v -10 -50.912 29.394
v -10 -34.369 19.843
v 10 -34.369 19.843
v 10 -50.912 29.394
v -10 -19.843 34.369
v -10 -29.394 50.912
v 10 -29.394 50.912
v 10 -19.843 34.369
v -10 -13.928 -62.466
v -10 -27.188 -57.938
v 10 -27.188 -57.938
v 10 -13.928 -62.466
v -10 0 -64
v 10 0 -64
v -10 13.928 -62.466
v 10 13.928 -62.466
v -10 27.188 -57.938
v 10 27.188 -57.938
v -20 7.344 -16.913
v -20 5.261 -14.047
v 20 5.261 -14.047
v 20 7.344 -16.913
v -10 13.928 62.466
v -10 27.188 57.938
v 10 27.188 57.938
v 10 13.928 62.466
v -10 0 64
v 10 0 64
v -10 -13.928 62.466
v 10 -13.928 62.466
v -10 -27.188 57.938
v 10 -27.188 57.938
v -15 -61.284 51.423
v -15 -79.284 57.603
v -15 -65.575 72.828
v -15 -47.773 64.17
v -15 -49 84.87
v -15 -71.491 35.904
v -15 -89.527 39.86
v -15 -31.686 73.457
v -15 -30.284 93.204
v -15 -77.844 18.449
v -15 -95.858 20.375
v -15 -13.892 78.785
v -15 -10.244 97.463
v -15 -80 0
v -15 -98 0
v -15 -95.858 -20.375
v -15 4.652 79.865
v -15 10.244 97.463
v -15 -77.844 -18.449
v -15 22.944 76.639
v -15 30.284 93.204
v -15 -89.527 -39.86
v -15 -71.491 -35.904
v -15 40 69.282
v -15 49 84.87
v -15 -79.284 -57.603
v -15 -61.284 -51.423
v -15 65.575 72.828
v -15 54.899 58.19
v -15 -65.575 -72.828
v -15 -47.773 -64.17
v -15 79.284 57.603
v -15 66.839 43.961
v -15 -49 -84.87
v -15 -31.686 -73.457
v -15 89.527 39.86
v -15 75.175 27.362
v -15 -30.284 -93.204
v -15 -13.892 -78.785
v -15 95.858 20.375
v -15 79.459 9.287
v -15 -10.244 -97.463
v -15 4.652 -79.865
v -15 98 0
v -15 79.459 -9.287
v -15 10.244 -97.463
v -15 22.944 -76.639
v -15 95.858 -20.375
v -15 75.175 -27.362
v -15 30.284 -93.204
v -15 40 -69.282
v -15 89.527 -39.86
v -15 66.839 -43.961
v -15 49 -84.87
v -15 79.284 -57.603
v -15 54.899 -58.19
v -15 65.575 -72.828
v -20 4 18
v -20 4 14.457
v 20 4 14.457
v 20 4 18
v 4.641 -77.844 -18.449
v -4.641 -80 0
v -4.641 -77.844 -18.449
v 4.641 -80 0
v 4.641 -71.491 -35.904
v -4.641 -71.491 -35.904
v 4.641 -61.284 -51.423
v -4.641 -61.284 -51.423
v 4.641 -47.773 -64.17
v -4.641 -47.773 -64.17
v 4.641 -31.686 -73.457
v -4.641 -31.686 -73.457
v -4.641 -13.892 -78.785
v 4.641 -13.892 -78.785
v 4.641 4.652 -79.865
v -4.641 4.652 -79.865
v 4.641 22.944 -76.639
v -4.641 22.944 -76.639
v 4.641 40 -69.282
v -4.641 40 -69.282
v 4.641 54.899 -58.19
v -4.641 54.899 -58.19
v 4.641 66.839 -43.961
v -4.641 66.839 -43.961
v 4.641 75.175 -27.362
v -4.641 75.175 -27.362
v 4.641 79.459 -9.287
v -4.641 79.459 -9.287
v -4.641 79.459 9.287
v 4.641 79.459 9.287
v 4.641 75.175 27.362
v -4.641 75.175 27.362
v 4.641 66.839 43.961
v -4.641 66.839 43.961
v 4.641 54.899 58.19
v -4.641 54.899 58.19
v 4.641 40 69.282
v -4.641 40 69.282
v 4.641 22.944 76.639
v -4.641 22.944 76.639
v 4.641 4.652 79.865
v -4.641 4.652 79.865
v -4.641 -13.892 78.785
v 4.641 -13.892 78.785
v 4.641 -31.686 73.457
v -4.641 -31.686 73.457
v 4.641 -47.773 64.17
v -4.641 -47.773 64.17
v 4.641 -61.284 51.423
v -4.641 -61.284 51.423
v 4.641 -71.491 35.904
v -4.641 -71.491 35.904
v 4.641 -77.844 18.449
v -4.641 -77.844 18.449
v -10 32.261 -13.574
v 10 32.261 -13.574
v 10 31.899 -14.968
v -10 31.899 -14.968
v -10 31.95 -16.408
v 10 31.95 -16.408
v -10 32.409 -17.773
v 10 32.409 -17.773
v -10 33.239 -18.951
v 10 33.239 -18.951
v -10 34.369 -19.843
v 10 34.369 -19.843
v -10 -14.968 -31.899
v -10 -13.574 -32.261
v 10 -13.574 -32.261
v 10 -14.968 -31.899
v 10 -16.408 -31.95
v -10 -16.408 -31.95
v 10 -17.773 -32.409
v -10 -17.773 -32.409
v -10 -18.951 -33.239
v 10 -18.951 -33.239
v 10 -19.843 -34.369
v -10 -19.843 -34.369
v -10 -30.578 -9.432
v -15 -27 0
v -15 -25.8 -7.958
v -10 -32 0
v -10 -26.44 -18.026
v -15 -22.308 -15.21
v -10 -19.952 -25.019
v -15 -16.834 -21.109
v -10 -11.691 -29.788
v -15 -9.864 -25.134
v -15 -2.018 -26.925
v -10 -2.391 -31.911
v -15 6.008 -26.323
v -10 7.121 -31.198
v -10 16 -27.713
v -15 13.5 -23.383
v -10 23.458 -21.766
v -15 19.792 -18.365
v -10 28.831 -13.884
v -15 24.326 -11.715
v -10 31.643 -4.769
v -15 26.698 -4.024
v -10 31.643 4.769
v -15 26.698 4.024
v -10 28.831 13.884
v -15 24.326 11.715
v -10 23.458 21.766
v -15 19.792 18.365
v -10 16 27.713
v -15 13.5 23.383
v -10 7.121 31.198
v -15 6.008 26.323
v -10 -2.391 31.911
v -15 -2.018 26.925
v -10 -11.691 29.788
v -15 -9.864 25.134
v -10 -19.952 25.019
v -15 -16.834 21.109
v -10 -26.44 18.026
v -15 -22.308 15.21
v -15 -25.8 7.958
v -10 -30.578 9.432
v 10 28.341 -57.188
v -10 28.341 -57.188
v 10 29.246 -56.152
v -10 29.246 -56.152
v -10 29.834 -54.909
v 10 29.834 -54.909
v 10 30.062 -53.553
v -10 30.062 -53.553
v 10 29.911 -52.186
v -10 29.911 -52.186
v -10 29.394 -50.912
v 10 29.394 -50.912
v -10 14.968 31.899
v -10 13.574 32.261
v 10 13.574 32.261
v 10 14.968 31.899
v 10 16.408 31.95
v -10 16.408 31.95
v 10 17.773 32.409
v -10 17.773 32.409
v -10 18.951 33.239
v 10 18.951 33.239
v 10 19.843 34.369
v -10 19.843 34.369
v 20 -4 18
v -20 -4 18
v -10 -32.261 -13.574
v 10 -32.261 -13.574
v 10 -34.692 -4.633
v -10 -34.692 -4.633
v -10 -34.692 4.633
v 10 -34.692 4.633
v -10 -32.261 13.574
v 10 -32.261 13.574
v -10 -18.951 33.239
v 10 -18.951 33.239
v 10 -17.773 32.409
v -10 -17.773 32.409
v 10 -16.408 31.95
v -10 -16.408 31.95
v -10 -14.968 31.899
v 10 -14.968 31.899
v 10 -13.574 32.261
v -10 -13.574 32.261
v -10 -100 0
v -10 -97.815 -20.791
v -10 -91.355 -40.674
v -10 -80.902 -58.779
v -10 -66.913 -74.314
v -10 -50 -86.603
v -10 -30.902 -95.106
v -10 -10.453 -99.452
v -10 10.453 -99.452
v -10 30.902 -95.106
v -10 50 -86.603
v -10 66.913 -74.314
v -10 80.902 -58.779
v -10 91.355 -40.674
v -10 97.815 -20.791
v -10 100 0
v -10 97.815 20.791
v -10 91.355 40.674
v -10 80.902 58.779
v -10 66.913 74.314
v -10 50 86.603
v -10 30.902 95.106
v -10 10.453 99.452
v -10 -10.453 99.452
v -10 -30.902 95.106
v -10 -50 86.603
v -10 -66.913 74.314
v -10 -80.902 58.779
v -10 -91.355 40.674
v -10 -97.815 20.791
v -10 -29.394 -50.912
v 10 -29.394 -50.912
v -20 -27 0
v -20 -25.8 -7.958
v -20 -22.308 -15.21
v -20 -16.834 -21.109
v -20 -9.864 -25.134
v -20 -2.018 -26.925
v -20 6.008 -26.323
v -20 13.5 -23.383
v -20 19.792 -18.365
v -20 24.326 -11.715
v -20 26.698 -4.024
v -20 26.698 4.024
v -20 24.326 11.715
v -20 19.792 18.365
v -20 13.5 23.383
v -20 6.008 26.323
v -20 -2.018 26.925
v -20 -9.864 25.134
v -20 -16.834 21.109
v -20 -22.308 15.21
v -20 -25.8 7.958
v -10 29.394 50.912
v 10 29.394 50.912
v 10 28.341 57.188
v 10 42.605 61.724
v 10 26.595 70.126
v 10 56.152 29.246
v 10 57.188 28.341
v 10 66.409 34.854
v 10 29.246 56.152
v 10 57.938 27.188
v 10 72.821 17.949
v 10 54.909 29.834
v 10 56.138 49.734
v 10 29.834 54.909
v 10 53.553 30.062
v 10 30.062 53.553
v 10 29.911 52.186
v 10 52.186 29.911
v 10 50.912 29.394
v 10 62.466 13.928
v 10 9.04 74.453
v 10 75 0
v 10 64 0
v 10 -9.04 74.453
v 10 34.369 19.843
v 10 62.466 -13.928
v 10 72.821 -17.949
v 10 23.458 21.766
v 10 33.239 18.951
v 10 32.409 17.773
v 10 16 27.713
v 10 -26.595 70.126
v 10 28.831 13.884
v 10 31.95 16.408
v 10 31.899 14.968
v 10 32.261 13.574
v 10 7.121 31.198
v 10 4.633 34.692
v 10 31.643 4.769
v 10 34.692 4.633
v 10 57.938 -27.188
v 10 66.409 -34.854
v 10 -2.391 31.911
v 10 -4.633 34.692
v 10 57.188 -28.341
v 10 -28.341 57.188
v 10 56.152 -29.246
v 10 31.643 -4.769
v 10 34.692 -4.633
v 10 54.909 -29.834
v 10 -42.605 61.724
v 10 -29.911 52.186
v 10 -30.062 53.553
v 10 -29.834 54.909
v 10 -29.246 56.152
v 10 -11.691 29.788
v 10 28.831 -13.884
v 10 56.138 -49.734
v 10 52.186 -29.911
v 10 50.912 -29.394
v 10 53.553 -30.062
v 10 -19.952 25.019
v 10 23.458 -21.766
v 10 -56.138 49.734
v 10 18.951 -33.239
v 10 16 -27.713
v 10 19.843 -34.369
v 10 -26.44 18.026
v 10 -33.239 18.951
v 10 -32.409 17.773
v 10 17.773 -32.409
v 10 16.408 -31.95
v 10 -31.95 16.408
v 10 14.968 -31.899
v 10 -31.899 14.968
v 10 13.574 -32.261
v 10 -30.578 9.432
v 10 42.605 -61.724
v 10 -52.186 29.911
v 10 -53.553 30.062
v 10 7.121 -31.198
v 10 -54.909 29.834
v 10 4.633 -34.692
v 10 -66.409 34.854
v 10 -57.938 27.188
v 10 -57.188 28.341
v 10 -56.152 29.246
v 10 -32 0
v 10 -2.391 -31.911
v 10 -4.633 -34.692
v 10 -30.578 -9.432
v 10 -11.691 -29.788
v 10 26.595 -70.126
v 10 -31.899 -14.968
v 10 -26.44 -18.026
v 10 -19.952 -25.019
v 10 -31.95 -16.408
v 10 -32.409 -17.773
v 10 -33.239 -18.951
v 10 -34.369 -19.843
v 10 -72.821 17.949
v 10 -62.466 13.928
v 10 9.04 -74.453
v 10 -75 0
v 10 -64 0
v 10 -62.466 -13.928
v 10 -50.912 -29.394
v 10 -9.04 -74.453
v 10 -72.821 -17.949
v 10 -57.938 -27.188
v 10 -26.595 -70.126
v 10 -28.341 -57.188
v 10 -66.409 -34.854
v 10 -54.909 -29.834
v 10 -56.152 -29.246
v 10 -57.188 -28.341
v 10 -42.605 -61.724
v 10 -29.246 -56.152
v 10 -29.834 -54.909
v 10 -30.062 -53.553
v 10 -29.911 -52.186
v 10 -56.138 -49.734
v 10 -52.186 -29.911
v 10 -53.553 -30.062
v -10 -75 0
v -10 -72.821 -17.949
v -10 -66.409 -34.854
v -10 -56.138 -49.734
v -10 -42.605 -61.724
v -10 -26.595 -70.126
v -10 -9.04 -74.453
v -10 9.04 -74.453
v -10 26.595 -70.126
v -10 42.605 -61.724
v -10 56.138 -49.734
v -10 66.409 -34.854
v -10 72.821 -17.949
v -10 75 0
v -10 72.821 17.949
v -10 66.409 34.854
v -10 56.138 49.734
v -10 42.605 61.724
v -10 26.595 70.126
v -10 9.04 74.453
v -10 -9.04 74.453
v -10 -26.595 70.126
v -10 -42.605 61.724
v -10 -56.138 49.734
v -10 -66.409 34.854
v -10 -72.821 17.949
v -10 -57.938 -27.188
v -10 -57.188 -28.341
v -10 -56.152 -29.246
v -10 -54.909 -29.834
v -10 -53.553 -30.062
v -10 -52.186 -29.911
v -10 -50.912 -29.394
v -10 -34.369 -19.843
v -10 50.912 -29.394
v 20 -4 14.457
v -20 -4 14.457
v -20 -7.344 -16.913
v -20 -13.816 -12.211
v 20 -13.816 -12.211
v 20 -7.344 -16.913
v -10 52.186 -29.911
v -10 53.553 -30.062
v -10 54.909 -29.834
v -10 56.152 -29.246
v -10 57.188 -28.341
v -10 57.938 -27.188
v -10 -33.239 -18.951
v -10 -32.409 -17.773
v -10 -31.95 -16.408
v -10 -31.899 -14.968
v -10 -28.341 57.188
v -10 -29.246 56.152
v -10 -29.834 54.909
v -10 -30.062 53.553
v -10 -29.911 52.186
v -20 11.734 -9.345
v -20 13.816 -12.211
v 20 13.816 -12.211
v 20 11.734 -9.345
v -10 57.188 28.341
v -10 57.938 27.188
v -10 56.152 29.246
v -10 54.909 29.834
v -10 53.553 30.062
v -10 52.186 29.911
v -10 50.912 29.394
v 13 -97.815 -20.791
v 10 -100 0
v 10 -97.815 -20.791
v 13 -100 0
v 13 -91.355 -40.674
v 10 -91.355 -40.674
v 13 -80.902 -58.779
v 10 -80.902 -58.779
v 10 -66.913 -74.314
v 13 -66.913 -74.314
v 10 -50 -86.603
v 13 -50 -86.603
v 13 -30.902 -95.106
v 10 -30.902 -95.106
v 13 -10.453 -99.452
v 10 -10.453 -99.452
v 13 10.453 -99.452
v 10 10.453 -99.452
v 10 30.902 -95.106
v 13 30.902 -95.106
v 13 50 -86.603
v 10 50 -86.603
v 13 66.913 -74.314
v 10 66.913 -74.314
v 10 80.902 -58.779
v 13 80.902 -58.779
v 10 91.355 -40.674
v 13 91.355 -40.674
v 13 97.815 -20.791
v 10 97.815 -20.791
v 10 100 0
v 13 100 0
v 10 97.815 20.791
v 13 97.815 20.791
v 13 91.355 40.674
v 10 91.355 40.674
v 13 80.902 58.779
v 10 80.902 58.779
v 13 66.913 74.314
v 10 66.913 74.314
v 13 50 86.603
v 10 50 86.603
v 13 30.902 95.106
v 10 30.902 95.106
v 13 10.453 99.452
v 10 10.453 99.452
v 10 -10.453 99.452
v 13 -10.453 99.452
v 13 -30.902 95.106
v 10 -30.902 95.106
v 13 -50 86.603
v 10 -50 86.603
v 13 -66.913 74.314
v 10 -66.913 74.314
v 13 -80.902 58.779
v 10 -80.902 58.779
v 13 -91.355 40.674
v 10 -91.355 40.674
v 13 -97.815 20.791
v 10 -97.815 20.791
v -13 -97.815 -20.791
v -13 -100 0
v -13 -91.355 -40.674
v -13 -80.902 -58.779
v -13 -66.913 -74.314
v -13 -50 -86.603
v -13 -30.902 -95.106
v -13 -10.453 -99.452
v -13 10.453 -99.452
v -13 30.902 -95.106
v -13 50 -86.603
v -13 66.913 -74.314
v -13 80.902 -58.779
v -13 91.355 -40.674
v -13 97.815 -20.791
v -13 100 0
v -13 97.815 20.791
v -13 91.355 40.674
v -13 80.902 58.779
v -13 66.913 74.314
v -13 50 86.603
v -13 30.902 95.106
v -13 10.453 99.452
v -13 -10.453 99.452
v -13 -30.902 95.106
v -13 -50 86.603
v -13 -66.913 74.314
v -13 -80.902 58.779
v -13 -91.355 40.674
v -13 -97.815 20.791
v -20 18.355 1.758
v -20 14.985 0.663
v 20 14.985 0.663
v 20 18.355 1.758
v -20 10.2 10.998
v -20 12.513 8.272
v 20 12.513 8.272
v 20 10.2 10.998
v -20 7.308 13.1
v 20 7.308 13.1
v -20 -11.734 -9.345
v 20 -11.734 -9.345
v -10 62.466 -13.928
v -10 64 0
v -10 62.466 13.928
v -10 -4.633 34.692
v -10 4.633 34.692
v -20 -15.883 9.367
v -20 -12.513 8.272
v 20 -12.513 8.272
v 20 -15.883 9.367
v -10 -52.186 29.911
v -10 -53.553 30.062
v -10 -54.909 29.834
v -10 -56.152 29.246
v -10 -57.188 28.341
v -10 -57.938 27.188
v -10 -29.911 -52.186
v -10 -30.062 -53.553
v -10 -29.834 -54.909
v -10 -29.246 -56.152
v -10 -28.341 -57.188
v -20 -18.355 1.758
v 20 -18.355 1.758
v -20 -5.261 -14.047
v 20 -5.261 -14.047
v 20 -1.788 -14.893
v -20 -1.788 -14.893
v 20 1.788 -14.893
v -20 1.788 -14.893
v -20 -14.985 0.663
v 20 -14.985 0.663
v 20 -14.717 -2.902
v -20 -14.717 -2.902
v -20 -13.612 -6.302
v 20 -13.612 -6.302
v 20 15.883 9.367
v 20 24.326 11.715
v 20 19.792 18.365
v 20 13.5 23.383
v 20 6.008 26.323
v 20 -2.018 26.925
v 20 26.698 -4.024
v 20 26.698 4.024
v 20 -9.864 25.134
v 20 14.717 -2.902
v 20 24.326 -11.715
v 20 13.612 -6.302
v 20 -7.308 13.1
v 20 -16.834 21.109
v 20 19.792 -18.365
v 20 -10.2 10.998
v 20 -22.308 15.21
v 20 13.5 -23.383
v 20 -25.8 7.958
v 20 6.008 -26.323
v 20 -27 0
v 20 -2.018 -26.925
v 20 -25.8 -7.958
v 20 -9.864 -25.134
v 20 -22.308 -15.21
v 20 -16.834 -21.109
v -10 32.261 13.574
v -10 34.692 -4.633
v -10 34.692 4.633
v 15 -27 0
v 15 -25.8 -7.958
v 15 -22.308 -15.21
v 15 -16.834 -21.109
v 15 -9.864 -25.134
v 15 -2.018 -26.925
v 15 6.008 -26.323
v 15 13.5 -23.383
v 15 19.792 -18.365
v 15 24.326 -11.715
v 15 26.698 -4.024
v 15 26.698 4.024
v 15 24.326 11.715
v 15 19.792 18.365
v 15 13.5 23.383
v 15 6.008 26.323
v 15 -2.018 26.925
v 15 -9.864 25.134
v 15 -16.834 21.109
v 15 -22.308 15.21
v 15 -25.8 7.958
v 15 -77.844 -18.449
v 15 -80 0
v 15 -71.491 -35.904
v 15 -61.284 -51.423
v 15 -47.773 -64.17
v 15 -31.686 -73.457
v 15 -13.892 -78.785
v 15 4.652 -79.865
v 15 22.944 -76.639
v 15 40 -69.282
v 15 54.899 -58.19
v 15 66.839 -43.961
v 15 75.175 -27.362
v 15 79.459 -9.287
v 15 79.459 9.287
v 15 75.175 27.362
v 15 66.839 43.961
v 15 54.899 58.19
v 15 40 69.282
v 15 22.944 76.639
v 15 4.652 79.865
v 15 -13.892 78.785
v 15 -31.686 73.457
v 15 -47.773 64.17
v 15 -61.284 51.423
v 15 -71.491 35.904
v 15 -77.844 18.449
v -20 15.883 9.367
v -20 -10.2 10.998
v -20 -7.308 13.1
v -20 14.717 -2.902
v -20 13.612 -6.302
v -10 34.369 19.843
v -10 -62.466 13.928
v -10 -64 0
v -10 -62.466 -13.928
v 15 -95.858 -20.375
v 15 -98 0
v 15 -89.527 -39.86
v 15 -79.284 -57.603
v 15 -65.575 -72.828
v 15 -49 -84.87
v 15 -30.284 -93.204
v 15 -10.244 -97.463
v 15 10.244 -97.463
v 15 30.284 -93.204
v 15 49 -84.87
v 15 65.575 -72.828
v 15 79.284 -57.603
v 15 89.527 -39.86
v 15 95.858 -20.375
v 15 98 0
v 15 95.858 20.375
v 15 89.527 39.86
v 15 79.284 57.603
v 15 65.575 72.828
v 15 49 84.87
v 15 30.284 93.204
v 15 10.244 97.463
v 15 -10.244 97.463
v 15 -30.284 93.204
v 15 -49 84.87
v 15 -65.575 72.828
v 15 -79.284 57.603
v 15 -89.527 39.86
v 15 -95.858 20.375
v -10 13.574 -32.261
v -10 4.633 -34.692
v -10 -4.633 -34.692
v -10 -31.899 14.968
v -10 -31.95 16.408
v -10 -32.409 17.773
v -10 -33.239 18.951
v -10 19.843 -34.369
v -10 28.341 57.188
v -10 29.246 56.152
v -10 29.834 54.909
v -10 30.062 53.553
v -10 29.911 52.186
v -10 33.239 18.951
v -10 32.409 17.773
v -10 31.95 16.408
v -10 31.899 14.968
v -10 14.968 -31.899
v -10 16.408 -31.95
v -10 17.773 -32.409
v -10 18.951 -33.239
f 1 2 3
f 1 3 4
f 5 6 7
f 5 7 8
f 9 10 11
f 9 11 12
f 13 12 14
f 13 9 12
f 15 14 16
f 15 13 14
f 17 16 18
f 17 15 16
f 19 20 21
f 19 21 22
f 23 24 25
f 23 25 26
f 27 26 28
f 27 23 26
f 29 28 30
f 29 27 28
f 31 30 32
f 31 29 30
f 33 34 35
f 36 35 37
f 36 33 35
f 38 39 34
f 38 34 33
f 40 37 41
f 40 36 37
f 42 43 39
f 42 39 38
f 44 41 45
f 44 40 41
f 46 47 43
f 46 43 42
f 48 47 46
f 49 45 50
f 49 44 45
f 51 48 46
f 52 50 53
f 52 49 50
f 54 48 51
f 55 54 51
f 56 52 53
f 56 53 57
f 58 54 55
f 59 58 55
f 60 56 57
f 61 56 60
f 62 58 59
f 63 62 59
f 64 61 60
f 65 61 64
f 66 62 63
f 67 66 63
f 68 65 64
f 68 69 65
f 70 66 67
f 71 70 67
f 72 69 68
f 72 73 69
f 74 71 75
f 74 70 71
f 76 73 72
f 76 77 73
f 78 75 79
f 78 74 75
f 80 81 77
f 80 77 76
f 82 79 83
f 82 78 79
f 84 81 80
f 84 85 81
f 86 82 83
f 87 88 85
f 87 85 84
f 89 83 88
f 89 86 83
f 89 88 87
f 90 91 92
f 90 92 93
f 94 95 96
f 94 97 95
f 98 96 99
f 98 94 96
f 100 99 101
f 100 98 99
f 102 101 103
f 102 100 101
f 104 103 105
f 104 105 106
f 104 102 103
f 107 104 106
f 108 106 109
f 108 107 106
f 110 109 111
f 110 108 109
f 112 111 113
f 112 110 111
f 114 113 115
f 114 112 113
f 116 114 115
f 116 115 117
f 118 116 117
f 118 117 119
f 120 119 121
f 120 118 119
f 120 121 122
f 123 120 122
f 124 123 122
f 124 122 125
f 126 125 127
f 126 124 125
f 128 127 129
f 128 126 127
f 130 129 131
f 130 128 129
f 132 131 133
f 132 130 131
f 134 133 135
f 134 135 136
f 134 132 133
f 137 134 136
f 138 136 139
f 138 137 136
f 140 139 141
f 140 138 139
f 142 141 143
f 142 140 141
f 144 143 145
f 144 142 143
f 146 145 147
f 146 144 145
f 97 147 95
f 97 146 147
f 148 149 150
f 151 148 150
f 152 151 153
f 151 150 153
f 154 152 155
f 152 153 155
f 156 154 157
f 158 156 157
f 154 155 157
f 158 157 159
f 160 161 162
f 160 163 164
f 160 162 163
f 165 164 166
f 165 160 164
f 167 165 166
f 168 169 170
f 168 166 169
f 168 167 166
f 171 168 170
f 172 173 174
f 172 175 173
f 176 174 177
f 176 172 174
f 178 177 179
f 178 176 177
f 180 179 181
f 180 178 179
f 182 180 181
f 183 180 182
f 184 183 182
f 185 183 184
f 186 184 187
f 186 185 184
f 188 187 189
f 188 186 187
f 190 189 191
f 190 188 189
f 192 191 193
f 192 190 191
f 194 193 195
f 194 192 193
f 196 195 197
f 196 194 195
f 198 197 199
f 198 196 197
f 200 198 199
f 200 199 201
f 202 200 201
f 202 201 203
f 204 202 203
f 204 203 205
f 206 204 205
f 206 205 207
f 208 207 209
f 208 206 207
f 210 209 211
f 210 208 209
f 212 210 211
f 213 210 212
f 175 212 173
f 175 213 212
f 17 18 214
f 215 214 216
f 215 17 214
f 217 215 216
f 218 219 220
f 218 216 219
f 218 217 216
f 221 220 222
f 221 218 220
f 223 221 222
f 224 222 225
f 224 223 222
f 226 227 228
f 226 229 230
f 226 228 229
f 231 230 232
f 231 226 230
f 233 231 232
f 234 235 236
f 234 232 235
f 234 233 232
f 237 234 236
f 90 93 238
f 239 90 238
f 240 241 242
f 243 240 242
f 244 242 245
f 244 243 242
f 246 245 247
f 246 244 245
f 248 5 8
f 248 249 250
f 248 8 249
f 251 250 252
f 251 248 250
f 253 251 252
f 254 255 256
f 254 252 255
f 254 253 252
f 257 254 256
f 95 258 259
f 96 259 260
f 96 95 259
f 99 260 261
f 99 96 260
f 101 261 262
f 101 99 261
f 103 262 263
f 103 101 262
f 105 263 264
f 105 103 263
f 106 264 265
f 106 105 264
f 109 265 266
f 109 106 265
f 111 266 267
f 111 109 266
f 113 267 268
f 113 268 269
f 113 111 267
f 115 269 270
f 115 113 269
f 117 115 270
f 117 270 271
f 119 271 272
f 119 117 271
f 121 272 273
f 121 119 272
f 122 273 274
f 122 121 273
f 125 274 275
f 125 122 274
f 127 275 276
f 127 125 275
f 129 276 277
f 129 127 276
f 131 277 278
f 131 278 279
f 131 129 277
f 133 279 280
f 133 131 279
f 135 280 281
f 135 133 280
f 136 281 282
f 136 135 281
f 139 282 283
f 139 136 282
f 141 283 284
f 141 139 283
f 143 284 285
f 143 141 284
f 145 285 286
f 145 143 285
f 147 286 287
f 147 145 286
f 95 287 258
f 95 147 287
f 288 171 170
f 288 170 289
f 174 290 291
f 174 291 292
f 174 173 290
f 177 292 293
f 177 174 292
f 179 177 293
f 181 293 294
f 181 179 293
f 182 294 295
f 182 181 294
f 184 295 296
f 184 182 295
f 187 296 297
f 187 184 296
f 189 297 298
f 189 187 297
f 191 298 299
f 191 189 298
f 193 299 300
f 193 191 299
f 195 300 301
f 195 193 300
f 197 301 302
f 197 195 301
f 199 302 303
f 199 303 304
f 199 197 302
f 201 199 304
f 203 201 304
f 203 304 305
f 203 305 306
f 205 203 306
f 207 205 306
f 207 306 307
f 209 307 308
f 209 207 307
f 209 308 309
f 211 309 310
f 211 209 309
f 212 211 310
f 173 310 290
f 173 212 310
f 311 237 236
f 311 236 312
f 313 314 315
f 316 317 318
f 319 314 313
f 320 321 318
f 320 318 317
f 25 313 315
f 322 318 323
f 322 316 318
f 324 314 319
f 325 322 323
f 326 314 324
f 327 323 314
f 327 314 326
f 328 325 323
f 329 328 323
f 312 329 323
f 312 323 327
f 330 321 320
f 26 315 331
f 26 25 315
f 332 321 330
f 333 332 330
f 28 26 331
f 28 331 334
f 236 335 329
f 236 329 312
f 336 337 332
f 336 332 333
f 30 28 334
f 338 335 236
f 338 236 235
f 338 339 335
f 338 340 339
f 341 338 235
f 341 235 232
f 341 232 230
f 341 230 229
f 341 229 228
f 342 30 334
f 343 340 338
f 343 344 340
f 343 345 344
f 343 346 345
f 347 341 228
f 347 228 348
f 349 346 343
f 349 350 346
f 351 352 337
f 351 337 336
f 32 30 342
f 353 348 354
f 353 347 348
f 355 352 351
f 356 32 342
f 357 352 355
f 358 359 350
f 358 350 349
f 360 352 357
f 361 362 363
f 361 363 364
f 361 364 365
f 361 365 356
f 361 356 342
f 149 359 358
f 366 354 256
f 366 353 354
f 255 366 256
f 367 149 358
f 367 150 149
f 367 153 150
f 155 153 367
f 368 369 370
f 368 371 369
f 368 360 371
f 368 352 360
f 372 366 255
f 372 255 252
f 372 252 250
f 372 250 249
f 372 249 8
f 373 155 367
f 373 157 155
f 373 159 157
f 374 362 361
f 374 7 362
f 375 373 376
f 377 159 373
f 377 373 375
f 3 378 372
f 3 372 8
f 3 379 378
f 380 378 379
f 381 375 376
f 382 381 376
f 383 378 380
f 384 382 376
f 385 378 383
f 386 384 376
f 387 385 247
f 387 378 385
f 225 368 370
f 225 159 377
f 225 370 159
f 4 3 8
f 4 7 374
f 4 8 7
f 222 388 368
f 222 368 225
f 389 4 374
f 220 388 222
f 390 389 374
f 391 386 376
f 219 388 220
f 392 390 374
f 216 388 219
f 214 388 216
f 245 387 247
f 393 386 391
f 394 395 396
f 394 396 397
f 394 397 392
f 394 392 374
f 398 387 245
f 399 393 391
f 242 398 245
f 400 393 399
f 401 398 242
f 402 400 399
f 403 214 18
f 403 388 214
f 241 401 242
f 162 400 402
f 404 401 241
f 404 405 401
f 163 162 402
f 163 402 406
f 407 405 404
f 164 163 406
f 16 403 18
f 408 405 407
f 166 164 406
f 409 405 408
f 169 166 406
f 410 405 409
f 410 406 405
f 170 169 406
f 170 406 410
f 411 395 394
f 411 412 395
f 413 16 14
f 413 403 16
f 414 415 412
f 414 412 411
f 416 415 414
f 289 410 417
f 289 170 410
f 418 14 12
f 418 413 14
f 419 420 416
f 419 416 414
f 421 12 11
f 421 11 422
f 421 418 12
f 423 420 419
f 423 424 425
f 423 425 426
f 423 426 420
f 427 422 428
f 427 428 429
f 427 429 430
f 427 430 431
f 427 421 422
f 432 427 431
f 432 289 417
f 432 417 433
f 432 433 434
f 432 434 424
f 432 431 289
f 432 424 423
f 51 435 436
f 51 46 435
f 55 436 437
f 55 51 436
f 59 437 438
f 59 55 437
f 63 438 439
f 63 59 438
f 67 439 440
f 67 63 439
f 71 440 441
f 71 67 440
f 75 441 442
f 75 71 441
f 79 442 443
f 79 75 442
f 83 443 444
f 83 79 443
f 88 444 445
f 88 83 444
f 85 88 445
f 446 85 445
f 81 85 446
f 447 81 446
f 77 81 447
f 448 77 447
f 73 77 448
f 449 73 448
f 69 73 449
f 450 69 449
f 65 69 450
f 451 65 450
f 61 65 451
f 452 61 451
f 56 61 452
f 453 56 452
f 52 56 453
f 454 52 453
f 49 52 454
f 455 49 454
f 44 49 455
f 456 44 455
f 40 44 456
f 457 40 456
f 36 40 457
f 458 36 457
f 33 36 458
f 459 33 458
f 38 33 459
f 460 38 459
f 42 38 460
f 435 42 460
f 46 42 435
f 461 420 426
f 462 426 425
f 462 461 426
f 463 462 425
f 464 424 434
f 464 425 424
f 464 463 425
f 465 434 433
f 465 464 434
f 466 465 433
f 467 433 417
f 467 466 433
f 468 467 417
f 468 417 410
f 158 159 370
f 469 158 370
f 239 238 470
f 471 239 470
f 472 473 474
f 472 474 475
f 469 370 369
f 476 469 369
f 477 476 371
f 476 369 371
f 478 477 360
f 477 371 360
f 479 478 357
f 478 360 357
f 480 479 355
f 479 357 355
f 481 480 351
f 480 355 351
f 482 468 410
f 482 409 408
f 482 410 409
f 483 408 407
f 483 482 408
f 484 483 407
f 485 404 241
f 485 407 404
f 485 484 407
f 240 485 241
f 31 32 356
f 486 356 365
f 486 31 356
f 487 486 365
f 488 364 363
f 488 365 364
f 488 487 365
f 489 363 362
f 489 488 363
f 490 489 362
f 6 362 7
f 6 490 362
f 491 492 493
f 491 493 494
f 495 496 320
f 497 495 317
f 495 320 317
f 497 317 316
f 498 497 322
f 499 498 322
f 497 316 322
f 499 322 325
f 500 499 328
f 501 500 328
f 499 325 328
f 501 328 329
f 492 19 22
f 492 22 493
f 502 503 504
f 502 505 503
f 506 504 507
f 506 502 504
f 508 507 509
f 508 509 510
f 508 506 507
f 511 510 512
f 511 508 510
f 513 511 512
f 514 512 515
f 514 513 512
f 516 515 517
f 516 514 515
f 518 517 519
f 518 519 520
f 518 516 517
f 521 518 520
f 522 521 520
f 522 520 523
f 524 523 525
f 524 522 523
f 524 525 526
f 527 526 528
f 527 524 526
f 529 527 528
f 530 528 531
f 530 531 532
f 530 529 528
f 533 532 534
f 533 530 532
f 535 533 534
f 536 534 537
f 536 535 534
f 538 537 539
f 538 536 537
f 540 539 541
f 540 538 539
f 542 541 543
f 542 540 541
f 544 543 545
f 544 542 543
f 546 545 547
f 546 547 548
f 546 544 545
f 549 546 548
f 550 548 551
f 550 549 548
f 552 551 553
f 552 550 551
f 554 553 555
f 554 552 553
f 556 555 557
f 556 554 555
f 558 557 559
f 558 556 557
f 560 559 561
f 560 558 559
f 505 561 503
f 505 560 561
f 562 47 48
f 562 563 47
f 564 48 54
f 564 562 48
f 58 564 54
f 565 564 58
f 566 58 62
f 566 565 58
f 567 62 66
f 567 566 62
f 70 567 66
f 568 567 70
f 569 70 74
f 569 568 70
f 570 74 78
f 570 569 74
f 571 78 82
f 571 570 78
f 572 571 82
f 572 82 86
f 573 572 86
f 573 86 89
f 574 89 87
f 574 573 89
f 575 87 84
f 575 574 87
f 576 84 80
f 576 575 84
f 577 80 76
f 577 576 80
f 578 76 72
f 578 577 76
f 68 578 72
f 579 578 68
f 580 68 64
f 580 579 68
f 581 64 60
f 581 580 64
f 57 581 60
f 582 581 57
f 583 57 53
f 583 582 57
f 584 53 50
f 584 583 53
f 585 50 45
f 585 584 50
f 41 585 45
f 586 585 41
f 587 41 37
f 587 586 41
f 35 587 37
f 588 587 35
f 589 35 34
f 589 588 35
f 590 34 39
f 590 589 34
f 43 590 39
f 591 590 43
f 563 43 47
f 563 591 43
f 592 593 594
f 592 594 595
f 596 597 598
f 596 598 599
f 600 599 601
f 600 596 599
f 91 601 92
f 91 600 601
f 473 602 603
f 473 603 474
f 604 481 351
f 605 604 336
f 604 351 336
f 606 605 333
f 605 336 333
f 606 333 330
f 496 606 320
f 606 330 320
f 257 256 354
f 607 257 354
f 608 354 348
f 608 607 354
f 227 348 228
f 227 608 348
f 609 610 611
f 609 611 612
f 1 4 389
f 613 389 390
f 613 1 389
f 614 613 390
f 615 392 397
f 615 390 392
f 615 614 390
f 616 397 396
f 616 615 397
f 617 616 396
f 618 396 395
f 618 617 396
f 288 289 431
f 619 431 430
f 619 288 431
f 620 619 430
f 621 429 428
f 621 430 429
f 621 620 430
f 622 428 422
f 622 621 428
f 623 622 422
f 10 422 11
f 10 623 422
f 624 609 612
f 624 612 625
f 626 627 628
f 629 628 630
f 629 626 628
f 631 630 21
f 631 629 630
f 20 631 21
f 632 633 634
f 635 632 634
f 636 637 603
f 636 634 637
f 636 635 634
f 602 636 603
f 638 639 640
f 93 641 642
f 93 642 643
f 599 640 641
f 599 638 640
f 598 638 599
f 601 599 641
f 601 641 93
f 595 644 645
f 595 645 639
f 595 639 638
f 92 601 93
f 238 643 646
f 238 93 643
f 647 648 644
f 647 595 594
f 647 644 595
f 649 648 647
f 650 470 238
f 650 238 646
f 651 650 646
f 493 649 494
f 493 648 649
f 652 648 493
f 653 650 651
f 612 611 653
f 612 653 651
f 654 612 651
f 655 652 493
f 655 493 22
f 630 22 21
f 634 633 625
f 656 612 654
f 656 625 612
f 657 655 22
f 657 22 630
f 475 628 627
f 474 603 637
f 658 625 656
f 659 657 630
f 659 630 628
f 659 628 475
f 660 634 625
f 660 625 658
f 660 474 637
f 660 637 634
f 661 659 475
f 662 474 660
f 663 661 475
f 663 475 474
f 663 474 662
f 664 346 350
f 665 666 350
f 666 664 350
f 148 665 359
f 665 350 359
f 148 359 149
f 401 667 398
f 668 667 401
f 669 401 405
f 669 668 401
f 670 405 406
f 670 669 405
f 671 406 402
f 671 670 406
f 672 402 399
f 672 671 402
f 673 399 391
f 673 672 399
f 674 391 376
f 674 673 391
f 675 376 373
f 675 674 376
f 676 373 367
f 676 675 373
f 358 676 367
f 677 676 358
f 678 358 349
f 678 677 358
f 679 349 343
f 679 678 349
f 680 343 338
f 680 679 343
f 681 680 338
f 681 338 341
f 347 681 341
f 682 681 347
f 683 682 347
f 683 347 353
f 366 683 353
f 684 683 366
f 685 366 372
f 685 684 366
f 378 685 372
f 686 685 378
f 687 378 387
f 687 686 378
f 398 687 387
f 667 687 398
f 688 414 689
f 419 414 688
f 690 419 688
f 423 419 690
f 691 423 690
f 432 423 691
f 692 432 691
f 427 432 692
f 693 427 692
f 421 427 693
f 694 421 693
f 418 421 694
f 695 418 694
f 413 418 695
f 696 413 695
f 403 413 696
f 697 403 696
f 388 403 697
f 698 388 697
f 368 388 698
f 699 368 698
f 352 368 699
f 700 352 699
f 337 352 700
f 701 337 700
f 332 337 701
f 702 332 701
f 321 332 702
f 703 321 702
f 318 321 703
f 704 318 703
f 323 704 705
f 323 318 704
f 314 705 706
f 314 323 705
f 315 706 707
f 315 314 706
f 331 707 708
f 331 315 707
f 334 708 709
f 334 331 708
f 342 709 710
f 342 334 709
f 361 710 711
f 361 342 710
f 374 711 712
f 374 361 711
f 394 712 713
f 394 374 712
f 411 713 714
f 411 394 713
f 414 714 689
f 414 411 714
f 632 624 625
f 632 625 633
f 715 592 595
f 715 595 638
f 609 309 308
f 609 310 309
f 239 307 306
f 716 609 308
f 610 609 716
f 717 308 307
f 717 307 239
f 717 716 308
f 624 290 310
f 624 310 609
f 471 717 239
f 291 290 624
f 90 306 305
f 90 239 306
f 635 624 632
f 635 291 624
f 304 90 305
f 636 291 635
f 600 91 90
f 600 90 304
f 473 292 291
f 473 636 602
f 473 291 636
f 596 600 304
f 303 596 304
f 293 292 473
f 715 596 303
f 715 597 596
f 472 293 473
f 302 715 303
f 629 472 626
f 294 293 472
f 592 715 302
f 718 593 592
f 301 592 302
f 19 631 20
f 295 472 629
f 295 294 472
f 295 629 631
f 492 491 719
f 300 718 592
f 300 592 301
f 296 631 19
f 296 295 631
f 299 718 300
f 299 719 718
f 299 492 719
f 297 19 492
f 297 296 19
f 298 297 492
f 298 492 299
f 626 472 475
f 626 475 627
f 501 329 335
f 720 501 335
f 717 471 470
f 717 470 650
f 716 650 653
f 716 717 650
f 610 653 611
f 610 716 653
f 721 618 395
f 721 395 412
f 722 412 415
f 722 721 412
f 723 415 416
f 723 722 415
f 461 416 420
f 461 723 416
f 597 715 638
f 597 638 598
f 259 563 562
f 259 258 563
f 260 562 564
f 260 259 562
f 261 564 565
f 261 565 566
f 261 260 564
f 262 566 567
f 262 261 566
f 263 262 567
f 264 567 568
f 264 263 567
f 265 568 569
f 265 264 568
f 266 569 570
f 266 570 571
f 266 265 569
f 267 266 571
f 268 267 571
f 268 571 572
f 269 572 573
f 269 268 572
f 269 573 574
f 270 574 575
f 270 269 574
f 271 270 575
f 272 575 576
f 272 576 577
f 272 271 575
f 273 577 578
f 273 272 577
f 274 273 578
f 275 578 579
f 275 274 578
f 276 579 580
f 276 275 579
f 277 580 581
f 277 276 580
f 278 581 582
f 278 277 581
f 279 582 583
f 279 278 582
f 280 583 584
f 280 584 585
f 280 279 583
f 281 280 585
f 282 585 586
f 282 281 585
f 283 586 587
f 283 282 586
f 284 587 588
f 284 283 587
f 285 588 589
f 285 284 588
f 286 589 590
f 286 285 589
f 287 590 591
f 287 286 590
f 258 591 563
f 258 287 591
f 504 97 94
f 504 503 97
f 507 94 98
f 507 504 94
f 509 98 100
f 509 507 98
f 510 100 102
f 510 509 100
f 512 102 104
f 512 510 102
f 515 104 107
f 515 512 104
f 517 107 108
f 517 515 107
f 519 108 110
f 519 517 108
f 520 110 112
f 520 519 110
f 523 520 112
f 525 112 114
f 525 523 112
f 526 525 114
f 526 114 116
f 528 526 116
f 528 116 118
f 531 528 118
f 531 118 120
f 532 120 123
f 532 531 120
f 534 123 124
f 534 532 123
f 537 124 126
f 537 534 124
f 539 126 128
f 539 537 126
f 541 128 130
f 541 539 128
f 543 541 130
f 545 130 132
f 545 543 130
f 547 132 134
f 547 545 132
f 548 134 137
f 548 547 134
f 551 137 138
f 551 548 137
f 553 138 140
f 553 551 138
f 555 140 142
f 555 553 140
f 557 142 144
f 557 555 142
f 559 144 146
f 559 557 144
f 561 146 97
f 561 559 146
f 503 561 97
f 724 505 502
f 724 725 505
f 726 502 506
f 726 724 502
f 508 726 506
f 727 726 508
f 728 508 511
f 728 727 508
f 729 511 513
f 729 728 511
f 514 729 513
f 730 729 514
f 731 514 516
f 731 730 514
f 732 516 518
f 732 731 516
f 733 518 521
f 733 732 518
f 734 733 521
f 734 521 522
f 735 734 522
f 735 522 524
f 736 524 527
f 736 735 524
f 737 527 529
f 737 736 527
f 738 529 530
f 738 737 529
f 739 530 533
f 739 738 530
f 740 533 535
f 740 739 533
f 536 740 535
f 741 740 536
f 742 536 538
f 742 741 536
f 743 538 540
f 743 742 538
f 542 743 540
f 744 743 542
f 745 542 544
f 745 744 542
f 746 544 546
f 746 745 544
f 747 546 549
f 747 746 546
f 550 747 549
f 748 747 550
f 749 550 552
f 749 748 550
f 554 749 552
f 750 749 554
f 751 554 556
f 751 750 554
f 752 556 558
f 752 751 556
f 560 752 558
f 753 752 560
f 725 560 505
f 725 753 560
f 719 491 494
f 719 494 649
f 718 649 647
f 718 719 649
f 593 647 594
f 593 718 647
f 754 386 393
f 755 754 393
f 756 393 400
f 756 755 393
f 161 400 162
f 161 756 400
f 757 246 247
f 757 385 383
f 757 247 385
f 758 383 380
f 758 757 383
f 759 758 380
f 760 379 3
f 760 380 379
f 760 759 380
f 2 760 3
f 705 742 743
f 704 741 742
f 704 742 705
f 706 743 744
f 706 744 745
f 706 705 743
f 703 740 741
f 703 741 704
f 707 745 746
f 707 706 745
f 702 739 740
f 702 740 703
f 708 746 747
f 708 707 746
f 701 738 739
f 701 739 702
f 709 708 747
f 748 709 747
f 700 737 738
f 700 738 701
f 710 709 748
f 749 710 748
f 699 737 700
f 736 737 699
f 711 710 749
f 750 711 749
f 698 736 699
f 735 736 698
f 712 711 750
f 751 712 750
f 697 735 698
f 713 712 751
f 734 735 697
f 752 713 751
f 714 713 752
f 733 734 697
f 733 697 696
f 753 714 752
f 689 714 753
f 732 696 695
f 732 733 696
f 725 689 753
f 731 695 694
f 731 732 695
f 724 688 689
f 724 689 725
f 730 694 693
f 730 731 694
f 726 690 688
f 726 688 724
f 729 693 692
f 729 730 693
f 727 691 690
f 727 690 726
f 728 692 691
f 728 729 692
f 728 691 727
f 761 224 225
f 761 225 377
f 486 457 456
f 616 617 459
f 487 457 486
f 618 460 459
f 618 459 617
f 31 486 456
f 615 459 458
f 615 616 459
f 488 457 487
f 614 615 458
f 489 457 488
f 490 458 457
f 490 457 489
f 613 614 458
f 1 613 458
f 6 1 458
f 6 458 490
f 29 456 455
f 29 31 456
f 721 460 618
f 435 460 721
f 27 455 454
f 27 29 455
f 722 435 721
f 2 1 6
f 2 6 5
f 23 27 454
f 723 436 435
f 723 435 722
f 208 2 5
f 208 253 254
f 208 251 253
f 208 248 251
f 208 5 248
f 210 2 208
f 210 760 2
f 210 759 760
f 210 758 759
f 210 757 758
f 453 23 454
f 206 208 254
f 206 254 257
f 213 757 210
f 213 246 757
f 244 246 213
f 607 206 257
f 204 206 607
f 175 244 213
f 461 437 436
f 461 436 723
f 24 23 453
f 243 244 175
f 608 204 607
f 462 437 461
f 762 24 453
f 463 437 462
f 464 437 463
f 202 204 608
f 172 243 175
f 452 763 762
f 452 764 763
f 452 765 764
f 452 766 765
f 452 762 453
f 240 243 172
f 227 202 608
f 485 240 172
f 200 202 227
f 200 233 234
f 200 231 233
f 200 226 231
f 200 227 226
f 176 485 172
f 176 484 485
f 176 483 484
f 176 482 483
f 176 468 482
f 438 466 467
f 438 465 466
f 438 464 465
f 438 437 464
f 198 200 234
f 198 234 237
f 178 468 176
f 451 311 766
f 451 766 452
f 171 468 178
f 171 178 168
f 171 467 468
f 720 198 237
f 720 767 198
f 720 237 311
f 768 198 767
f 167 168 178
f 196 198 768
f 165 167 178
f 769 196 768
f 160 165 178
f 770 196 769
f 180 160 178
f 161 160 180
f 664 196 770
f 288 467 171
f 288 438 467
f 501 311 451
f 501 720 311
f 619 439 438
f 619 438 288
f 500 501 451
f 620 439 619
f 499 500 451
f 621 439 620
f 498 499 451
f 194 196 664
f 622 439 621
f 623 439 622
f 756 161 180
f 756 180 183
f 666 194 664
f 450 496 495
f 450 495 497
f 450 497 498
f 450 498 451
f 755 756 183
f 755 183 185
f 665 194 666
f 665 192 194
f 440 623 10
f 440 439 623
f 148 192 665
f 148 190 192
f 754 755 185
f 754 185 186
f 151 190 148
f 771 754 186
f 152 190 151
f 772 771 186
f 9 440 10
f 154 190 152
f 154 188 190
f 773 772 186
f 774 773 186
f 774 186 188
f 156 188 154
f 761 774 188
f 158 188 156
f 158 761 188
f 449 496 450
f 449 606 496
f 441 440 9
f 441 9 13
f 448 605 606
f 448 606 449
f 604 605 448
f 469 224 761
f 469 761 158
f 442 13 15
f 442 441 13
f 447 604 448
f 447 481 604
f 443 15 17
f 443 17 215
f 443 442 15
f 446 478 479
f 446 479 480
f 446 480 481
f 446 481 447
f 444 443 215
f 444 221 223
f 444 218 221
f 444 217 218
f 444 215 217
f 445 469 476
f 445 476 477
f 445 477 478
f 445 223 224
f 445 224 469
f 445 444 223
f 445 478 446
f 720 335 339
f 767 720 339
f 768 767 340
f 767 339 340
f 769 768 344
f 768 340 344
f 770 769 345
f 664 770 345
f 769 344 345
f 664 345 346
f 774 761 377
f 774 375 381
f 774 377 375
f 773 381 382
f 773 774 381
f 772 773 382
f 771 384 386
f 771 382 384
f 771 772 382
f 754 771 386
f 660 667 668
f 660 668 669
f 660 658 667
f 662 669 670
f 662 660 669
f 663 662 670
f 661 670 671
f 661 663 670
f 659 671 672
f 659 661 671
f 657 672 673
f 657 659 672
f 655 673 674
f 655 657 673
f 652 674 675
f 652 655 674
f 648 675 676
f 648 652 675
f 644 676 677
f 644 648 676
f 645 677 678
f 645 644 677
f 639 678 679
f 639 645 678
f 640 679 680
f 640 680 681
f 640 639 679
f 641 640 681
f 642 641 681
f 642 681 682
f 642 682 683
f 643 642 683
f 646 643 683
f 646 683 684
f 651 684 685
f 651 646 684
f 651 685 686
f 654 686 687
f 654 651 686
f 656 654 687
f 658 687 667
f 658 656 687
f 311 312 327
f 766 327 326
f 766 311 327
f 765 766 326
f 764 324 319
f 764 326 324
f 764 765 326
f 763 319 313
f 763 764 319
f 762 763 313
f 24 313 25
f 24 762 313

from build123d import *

# Parameters (mm, degrees)
F3_DEPTH = 70


with BuildPart() as f1:
    # F0 (on Top) → F1 (revolve)
    with BuildSketch(Plane.XY):
        Polygon((20, -27), (20, 0), (-20, 0), (-20, -27), (-15, -27), (-10, -32), (-10, -75), (-15, -80), (-15, -98), (-13, -100), (-10, -100), (-4.641016, -80), (0, -80), (4.641016, -80), (10, -100), (13, -100), (15, -98), (15, -80), (10, -75), (10, -32), (15, -27), align=None)
    revolve(axis=Axis((0, 0, 0), (1, 0, 0)))

    # F2 (on face) → F3 (cut, symmetric)
    with BuildSketch(Plane.YZ.offset(10)):
        with BuildLine():
            ThreePointArc((29.393877, 50.911688), (29.83415, 54.909449), (27.187796, 57.938103))
            ThreePointArc((27.187796, 57.938103), (0, 64), (-27.187796, 57.938103))
            ThreePointArc((-27.187796, 57.938103), (-29.83415, 54.909449), (-29.393877, 50.911688))
            Line((-29.393877, 50.911688), (-19.843135, 34.369318))
            ThreePointArc((-19.843135, 34.369318), (-17.107009, 32.130208), (-13.573882, 32.260653))
            ThreePointArc((-13.573882, 32.260653), (0, 35), (13.573882, 32.260653))
            ThreePointArc((13.573882, 32.260653), (17.107009, 32.130208), (19.843135, 34.369318))
            Line((19.843135, 34.369318), (29.393877, 50.911688))
        make_face()
        with BuildLine():
            Line((-4, 18), (-4, 14.456832))
            ThreePointArc((-4, 14.456832), (-8.816779, 12.135255), (-12.513197, 8.271633))
            Line((-12.513197, 8.271633), (-15.882949, 9.366532))
            Line((-15.882949, 9.366532), (-18.355085, 1.75808))
            Line((-18.355085, 1.75808), (-14.985333, 0.663181))
            ThreePointArc((-14.985333, 0.663181), (-14.265848, -4.635255), (-11.733581, -9.344682))
            Line((-11.733581, -9.344682), (-13.816203, -12.211165))
            Line((-13.816203, -12.211165), (-7.344067, -16.913447))
            Line((-7.344067, -16.913447), (-5.261445, -14.046964))
            ThreePointArc((-5.261445, -14.046964), (0, -15), (5.261445, -14.046964))
            Line((5.261445, -14.046964), (7.344067, -16.913447))
            Line((7.344067, -16.913447), (13.816203, -12.211165))
            Line((13.816203, -12.211165), (11.733581, -9.344682))
            ThreePointArc((11.733581, -9.344682), (14.265848, -4.635255), (14.985333, 0.663181))
            Line((14.985333, 0.663181), (18.355085, 1.75808))
            Line((18.355085, 1.75808), (15.882949, 9.366532))
            Line((15.882949, 9.366532), (12.513197, 8.271633))
            ThreePointArc((12.513197, 8.271633), (8.816779, 12.135255), (4, 14.456832))
            Line((4, 14.456832), (4, 18))
            Line((4, 18), (-4, 18))
        make_face()
        with BuildLine():
            ThreePointArc((-50.911688, 29.393877), (-54.909449, 29.83415), (-57.938103, 27.187796))
            ThreePointArc((-57.938103, 27.187796), (-64, 0), (-57.938103, -27.187796))
            ThreePointArc((-57.938103, -27.187796), (-54.909449, -29.83415), (-50.911688, -29.393877))
            Line((-50.911688, -29.393877), (-34.369318, -19.843135))
            ThreePointArc((-34.369318, -19.843135), (-32.130208, -17.107009), (-32.260653, -13.573882))
            ThreePointArc((-32.260653, -13.573882), (-35, 0), (-32.260653, 13.573882))
            ThreePointArc((-32.260653, 13.573882), (-32.130208, 17.107009), (-34.369318, 19.843135))
            Line((-34.369318, 19.843135), (-50.911688, 29.393877))
        make_face()
        with BuildLine():
            ThreePointArc((-29.393877, -50.911688), (-29.83415, -54.909449), (-27.187796, -57.938103))
            ThreePointArc((-27.187796, -57.938103), (0, -64), (27.187796, -57.938103))
            ThreePointArc((27.187796, -57.938103), (29.83415, -54.909449), (29.393877, -50.911688))
            Line((29.393877, -50.911688), (19.843135, -34.369318))
            ThreePointArc((19.843135, -34.369318), (17.107009, -32.130208), (13.573882, -32.260653))
            ThreePointArc((13.573882, -32.260653), (0, -35), (-13.573882, -32.260653))
            ThreePointArc((-13.573882, -32.260653), (-17.107009, -32.130208), (-19.843135, -34.369318))
            Line((-19.843135, -34.369318), (-29.393877, -50.911688))
        make_face()
        with BuildLine():
            ThreePointArc((50.911688, -29.393877), (54.909449, -29.83415), (57.938103, -27.187796))
            ThreePointArc((57.938103, -27.187796), (64, 0), (57.938103, 27.187796))
            ThreePointArc((57.938103, 27.187796), (54.909449, 29.83415), (50.911688, 29.393877))
            Line((50.911688, 29.393877), (34.369318, 19.843135))
            ThreePointArc((34.369318, 19.843135), (32.130208, 17.107009), (32.260653, 13.573882))
            ThreePointArc((32.260653, 13.573882), (35, 0), (32.260653, -13.573882))
            ThreePointArc((32.260653, -13.573882), (32.130208, -17.107009), (34.369318, -19.843135))
            Line((34.369318, -19.843135), (50.911688, -29.393877))
        make_face()
    extrude(amount=F3_DEPTH, both=True, mode=Mode.SUBTRACT)


solid = f1.part
